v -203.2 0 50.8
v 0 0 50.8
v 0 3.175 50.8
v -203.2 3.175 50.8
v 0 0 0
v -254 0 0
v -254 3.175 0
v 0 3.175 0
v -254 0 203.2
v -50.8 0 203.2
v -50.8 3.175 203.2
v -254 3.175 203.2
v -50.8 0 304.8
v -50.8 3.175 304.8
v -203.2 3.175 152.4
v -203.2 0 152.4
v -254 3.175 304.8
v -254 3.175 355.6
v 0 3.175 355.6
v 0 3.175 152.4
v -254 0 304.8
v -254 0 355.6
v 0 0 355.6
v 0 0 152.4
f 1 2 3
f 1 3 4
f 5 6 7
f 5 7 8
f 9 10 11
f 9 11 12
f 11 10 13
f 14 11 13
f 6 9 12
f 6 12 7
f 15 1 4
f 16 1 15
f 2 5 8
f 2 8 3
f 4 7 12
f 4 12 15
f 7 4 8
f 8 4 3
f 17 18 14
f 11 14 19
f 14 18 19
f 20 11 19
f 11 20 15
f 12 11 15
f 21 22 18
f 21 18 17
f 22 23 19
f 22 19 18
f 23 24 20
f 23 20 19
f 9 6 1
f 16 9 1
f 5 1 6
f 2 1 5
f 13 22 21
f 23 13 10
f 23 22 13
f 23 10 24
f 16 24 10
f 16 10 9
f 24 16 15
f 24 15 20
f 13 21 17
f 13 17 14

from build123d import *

# Parameters (mm, degrees)
F0_W     = 50.8
F0_H     = 101.6
F1_DEPTH = 3.175


with BuildPart() as f1:
    # F0 (on Front) → F1 (new body)
    with BuildSketch(Plane.XZ):
        Polygon((-254, 0), (0, 0), (0, 50.8), (-203.2, 50.8), (-254, 50.8), align=None)
        with Locations((-228.6, 101.6)):
            Rectangle(F0_W, F0_H)
        Polygon((-254, 203.2), (-254, 152.4), (-203.2, 152.4), (0, 152.4), (0, 203.2), (-50.8, 203.2), align=None)
        with Locations((-25.4, 254)):
            Rectangle(F0_W, F0_H)
        Polygon((-254, 304.8), (-50.8, 304.8), (0, 304.8), (0, 355.6), (-254, 355.6), align=None)
    extrude(amount=-F1_DEPTH)


solid = f1.part
